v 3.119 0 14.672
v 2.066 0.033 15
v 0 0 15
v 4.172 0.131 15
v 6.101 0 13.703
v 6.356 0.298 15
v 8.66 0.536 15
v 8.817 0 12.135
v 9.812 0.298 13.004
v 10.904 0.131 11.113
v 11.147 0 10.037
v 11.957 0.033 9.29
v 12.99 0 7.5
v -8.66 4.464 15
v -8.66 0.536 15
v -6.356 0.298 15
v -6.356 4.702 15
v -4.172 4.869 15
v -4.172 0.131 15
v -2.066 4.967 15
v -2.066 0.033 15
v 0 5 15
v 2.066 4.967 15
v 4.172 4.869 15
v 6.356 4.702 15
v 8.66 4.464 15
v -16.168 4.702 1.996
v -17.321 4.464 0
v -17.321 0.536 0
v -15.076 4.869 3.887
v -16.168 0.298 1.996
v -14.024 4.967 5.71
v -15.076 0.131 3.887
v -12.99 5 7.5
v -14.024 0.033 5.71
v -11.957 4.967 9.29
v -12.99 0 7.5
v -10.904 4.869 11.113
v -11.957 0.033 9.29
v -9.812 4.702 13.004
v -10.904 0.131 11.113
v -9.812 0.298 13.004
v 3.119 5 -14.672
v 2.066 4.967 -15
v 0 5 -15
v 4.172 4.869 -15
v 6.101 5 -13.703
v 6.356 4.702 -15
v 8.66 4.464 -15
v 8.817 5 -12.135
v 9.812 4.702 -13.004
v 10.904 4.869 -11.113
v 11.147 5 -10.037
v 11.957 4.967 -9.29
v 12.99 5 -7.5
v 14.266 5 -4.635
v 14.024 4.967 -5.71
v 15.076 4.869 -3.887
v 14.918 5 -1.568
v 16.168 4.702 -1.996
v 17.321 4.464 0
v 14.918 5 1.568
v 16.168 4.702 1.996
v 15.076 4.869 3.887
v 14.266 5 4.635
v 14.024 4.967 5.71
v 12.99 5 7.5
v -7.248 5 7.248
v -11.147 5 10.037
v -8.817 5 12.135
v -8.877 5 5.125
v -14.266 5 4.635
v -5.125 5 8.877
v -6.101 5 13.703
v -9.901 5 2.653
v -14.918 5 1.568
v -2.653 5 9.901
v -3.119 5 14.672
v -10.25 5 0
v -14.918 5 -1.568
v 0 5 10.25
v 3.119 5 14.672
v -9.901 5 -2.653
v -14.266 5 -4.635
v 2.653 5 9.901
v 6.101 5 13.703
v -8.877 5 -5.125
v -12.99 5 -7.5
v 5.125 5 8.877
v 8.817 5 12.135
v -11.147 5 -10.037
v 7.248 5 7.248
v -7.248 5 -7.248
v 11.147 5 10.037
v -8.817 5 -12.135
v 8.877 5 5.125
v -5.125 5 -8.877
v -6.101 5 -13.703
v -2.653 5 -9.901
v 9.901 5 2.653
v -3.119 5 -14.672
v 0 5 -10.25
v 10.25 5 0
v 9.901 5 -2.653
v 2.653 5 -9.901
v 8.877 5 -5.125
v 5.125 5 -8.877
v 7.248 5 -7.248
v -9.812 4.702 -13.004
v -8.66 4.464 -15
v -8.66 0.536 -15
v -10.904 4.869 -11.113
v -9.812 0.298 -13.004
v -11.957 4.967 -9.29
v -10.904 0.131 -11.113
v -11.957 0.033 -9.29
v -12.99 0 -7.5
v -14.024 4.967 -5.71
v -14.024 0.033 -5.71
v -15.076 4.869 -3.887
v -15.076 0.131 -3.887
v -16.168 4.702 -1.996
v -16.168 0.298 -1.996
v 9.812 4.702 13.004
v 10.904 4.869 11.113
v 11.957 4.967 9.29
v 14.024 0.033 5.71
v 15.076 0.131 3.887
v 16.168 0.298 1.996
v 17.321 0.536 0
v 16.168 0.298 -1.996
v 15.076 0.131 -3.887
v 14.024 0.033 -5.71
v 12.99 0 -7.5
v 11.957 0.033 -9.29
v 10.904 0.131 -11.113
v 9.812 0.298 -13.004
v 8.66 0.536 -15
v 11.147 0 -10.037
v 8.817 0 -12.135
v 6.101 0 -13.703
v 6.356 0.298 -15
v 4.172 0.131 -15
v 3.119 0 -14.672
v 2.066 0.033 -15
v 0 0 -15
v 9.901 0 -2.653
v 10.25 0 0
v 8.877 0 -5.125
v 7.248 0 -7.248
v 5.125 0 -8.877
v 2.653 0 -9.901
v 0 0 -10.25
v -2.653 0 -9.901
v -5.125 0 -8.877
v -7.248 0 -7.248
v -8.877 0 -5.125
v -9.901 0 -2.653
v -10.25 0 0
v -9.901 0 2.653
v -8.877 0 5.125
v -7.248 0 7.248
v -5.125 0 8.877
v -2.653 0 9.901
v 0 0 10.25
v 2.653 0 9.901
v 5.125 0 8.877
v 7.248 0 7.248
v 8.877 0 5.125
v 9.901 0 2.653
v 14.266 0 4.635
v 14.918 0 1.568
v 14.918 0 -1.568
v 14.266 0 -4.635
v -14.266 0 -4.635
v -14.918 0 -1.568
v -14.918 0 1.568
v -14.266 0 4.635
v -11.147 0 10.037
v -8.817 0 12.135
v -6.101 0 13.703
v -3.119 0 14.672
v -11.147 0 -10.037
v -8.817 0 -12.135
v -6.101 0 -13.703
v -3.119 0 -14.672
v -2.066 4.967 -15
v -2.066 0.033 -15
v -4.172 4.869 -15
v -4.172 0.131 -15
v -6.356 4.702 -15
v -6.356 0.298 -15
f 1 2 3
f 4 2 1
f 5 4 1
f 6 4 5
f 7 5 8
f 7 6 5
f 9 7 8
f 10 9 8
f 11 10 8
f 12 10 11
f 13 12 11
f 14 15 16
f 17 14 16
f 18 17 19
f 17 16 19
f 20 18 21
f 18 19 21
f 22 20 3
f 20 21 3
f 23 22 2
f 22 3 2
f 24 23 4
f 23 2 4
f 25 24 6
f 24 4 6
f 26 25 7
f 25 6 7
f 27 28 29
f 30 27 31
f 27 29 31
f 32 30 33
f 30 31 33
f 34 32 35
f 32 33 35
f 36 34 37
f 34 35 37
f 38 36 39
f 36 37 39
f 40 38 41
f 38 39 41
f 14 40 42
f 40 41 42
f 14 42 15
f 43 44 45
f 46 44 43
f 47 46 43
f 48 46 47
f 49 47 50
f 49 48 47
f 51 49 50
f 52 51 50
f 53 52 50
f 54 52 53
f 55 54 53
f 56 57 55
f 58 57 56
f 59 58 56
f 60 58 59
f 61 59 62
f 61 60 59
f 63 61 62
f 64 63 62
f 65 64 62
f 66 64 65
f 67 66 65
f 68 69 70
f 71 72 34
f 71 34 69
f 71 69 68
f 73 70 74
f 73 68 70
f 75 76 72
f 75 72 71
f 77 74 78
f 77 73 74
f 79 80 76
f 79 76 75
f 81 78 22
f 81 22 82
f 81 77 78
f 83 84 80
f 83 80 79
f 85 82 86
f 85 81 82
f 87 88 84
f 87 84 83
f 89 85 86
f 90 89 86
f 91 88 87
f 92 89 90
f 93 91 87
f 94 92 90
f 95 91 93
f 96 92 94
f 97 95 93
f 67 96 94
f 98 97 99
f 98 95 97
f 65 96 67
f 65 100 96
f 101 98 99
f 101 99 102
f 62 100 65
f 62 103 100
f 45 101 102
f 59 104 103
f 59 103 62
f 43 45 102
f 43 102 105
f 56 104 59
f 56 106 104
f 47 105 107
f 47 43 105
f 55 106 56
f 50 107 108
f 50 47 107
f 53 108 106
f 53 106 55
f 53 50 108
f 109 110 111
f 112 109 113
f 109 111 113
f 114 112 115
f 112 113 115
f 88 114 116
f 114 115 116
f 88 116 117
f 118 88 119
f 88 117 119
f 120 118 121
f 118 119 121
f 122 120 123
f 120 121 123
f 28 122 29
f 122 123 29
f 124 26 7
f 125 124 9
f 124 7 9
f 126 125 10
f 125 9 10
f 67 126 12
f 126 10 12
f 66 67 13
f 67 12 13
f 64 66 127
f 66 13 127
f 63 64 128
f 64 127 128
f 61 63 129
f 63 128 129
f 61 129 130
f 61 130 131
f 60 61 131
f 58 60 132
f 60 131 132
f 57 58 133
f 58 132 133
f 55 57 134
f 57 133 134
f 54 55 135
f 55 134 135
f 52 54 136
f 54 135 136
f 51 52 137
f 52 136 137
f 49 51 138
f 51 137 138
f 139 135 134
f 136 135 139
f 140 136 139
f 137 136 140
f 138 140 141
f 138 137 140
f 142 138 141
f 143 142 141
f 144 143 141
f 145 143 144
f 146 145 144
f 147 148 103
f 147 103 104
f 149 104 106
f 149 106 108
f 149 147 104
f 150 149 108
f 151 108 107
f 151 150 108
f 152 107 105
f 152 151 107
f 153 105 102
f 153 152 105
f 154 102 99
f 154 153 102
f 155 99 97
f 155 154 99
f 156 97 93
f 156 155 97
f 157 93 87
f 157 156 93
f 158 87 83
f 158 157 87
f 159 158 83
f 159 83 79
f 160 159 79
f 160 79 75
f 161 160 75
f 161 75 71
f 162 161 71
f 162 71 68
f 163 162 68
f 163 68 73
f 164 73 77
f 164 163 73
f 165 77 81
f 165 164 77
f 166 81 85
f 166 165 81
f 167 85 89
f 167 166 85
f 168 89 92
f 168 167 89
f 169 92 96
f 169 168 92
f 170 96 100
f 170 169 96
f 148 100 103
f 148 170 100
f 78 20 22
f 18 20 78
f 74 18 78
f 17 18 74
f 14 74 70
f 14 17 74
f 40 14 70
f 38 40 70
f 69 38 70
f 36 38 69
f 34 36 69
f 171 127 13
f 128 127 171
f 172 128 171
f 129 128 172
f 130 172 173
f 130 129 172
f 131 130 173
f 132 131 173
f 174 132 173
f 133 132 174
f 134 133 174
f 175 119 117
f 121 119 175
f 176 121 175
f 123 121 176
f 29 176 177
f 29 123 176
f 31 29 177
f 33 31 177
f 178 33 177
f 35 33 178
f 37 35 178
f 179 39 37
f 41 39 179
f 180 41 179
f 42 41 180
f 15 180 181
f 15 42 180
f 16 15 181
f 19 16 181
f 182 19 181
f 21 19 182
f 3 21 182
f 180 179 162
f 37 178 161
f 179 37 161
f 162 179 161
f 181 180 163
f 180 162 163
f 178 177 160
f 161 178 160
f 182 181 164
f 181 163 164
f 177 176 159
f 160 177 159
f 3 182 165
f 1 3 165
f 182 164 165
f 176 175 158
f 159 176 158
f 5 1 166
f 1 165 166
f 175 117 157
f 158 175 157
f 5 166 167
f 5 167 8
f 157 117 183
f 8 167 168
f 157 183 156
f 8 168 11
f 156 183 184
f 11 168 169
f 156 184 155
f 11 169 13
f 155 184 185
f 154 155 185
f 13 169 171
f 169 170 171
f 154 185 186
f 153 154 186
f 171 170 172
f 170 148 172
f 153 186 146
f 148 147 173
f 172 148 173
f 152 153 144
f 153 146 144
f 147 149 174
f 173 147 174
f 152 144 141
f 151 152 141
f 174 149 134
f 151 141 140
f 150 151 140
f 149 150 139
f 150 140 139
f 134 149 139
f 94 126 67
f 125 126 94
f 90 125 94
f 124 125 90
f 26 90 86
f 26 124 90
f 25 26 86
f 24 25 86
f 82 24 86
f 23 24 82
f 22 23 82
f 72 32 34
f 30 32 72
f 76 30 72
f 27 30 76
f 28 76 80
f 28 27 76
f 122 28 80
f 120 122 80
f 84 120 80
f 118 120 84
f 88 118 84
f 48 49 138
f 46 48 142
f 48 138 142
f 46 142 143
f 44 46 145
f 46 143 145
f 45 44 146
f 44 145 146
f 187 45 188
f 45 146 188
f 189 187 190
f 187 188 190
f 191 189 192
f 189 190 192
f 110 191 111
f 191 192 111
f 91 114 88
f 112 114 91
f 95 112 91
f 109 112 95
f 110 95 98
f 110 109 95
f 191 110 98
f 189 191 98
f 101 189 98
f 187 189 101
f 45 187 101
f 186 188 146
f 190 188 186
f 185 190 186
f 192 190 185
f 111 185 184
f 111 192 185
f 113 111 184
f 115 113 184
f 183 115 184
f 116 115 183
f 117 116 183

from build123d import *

# Parameters (mm, degrees)
SKETCH_1_R          = 10.25
EXTRUDE_1_DEPTH     = 5
SKETCH_2_OUTSIDE_W  = 97.84
SKETCH_2_OUTSIDE_H  = 93.198
SKETCH_2_OUTSIDE_R  = 15
CUT_EXTRUDE_1_DEPTH = 6
CUT_EXTRUDE_1_TAPER = 77
SKETCH_3_OUTSIDE_W  = 97.84
SKETCH_3_OUTSIDE_H  = 93.198
SKETCH_3_OUTSIDE_R  = 15
CUT_EXTRUDE_2_DEPTH = 6
CUT_EXTRUDE_2_TAPER = 77


with BuildPart() as part:
    # Эскиз1 → Бобышка-Вытянуть1 (new body)
    with BuildSketch(Plane(origin=(0, 0, 0), x_dir=(1, 0, 0), z_dir=(0, 1, 0))):
        Polygon((17.320508076, 0), (8.660254038, 15), (-8.660254038, 15), (-17.320508076, 0), (-8.660254038, -15), (8.660254038, -15), align=None)
        Circle(SKETCH_1_R, mode=Mode.SUBTRACT)
    extrude(amount=EXTRUDE_1_DEPTH)

    # Эскиз2 outside → Вырез-Вытянуть1 (cut, through all)
    with BuildSketch(Plane(origin=(0, 5, 0), x_dir=(1, 0, 0), z_dir=(0, 1, 0))):
        Rectangle(SKETCH_2_OUTSIDE_W, SKETCH_2_OUTSIDE_H)
        Circle(SKETCH_2_OUTSIDE_R, mode=Mode.SUBTRACT)
    extrude(amount=-CUT_EXTRUDE_1_DEPTH, taper=CUT_EXTRUDE_1_TAPER, mode=Mode.SUBTRACT)

    # Эскиз3 outside → Вырез-Вытянуть2 (cut, through all)
    with BuildSketch(Plane.XZ):
        Rectangle(SKETCH_3_OUTSIDE_W, SKETCH_3_OUTSIDE_H)
        Circle(SKETCH_3_OUTSIDE_R, mode=Mode.SUBTRACT)
    extrude(amount=-CUT_EXTRUDE_2_DEPTH, taper=CUT_EXTRUDE_2_TAPER, mode=Mode.SUBTRACT)


solid = part.part
